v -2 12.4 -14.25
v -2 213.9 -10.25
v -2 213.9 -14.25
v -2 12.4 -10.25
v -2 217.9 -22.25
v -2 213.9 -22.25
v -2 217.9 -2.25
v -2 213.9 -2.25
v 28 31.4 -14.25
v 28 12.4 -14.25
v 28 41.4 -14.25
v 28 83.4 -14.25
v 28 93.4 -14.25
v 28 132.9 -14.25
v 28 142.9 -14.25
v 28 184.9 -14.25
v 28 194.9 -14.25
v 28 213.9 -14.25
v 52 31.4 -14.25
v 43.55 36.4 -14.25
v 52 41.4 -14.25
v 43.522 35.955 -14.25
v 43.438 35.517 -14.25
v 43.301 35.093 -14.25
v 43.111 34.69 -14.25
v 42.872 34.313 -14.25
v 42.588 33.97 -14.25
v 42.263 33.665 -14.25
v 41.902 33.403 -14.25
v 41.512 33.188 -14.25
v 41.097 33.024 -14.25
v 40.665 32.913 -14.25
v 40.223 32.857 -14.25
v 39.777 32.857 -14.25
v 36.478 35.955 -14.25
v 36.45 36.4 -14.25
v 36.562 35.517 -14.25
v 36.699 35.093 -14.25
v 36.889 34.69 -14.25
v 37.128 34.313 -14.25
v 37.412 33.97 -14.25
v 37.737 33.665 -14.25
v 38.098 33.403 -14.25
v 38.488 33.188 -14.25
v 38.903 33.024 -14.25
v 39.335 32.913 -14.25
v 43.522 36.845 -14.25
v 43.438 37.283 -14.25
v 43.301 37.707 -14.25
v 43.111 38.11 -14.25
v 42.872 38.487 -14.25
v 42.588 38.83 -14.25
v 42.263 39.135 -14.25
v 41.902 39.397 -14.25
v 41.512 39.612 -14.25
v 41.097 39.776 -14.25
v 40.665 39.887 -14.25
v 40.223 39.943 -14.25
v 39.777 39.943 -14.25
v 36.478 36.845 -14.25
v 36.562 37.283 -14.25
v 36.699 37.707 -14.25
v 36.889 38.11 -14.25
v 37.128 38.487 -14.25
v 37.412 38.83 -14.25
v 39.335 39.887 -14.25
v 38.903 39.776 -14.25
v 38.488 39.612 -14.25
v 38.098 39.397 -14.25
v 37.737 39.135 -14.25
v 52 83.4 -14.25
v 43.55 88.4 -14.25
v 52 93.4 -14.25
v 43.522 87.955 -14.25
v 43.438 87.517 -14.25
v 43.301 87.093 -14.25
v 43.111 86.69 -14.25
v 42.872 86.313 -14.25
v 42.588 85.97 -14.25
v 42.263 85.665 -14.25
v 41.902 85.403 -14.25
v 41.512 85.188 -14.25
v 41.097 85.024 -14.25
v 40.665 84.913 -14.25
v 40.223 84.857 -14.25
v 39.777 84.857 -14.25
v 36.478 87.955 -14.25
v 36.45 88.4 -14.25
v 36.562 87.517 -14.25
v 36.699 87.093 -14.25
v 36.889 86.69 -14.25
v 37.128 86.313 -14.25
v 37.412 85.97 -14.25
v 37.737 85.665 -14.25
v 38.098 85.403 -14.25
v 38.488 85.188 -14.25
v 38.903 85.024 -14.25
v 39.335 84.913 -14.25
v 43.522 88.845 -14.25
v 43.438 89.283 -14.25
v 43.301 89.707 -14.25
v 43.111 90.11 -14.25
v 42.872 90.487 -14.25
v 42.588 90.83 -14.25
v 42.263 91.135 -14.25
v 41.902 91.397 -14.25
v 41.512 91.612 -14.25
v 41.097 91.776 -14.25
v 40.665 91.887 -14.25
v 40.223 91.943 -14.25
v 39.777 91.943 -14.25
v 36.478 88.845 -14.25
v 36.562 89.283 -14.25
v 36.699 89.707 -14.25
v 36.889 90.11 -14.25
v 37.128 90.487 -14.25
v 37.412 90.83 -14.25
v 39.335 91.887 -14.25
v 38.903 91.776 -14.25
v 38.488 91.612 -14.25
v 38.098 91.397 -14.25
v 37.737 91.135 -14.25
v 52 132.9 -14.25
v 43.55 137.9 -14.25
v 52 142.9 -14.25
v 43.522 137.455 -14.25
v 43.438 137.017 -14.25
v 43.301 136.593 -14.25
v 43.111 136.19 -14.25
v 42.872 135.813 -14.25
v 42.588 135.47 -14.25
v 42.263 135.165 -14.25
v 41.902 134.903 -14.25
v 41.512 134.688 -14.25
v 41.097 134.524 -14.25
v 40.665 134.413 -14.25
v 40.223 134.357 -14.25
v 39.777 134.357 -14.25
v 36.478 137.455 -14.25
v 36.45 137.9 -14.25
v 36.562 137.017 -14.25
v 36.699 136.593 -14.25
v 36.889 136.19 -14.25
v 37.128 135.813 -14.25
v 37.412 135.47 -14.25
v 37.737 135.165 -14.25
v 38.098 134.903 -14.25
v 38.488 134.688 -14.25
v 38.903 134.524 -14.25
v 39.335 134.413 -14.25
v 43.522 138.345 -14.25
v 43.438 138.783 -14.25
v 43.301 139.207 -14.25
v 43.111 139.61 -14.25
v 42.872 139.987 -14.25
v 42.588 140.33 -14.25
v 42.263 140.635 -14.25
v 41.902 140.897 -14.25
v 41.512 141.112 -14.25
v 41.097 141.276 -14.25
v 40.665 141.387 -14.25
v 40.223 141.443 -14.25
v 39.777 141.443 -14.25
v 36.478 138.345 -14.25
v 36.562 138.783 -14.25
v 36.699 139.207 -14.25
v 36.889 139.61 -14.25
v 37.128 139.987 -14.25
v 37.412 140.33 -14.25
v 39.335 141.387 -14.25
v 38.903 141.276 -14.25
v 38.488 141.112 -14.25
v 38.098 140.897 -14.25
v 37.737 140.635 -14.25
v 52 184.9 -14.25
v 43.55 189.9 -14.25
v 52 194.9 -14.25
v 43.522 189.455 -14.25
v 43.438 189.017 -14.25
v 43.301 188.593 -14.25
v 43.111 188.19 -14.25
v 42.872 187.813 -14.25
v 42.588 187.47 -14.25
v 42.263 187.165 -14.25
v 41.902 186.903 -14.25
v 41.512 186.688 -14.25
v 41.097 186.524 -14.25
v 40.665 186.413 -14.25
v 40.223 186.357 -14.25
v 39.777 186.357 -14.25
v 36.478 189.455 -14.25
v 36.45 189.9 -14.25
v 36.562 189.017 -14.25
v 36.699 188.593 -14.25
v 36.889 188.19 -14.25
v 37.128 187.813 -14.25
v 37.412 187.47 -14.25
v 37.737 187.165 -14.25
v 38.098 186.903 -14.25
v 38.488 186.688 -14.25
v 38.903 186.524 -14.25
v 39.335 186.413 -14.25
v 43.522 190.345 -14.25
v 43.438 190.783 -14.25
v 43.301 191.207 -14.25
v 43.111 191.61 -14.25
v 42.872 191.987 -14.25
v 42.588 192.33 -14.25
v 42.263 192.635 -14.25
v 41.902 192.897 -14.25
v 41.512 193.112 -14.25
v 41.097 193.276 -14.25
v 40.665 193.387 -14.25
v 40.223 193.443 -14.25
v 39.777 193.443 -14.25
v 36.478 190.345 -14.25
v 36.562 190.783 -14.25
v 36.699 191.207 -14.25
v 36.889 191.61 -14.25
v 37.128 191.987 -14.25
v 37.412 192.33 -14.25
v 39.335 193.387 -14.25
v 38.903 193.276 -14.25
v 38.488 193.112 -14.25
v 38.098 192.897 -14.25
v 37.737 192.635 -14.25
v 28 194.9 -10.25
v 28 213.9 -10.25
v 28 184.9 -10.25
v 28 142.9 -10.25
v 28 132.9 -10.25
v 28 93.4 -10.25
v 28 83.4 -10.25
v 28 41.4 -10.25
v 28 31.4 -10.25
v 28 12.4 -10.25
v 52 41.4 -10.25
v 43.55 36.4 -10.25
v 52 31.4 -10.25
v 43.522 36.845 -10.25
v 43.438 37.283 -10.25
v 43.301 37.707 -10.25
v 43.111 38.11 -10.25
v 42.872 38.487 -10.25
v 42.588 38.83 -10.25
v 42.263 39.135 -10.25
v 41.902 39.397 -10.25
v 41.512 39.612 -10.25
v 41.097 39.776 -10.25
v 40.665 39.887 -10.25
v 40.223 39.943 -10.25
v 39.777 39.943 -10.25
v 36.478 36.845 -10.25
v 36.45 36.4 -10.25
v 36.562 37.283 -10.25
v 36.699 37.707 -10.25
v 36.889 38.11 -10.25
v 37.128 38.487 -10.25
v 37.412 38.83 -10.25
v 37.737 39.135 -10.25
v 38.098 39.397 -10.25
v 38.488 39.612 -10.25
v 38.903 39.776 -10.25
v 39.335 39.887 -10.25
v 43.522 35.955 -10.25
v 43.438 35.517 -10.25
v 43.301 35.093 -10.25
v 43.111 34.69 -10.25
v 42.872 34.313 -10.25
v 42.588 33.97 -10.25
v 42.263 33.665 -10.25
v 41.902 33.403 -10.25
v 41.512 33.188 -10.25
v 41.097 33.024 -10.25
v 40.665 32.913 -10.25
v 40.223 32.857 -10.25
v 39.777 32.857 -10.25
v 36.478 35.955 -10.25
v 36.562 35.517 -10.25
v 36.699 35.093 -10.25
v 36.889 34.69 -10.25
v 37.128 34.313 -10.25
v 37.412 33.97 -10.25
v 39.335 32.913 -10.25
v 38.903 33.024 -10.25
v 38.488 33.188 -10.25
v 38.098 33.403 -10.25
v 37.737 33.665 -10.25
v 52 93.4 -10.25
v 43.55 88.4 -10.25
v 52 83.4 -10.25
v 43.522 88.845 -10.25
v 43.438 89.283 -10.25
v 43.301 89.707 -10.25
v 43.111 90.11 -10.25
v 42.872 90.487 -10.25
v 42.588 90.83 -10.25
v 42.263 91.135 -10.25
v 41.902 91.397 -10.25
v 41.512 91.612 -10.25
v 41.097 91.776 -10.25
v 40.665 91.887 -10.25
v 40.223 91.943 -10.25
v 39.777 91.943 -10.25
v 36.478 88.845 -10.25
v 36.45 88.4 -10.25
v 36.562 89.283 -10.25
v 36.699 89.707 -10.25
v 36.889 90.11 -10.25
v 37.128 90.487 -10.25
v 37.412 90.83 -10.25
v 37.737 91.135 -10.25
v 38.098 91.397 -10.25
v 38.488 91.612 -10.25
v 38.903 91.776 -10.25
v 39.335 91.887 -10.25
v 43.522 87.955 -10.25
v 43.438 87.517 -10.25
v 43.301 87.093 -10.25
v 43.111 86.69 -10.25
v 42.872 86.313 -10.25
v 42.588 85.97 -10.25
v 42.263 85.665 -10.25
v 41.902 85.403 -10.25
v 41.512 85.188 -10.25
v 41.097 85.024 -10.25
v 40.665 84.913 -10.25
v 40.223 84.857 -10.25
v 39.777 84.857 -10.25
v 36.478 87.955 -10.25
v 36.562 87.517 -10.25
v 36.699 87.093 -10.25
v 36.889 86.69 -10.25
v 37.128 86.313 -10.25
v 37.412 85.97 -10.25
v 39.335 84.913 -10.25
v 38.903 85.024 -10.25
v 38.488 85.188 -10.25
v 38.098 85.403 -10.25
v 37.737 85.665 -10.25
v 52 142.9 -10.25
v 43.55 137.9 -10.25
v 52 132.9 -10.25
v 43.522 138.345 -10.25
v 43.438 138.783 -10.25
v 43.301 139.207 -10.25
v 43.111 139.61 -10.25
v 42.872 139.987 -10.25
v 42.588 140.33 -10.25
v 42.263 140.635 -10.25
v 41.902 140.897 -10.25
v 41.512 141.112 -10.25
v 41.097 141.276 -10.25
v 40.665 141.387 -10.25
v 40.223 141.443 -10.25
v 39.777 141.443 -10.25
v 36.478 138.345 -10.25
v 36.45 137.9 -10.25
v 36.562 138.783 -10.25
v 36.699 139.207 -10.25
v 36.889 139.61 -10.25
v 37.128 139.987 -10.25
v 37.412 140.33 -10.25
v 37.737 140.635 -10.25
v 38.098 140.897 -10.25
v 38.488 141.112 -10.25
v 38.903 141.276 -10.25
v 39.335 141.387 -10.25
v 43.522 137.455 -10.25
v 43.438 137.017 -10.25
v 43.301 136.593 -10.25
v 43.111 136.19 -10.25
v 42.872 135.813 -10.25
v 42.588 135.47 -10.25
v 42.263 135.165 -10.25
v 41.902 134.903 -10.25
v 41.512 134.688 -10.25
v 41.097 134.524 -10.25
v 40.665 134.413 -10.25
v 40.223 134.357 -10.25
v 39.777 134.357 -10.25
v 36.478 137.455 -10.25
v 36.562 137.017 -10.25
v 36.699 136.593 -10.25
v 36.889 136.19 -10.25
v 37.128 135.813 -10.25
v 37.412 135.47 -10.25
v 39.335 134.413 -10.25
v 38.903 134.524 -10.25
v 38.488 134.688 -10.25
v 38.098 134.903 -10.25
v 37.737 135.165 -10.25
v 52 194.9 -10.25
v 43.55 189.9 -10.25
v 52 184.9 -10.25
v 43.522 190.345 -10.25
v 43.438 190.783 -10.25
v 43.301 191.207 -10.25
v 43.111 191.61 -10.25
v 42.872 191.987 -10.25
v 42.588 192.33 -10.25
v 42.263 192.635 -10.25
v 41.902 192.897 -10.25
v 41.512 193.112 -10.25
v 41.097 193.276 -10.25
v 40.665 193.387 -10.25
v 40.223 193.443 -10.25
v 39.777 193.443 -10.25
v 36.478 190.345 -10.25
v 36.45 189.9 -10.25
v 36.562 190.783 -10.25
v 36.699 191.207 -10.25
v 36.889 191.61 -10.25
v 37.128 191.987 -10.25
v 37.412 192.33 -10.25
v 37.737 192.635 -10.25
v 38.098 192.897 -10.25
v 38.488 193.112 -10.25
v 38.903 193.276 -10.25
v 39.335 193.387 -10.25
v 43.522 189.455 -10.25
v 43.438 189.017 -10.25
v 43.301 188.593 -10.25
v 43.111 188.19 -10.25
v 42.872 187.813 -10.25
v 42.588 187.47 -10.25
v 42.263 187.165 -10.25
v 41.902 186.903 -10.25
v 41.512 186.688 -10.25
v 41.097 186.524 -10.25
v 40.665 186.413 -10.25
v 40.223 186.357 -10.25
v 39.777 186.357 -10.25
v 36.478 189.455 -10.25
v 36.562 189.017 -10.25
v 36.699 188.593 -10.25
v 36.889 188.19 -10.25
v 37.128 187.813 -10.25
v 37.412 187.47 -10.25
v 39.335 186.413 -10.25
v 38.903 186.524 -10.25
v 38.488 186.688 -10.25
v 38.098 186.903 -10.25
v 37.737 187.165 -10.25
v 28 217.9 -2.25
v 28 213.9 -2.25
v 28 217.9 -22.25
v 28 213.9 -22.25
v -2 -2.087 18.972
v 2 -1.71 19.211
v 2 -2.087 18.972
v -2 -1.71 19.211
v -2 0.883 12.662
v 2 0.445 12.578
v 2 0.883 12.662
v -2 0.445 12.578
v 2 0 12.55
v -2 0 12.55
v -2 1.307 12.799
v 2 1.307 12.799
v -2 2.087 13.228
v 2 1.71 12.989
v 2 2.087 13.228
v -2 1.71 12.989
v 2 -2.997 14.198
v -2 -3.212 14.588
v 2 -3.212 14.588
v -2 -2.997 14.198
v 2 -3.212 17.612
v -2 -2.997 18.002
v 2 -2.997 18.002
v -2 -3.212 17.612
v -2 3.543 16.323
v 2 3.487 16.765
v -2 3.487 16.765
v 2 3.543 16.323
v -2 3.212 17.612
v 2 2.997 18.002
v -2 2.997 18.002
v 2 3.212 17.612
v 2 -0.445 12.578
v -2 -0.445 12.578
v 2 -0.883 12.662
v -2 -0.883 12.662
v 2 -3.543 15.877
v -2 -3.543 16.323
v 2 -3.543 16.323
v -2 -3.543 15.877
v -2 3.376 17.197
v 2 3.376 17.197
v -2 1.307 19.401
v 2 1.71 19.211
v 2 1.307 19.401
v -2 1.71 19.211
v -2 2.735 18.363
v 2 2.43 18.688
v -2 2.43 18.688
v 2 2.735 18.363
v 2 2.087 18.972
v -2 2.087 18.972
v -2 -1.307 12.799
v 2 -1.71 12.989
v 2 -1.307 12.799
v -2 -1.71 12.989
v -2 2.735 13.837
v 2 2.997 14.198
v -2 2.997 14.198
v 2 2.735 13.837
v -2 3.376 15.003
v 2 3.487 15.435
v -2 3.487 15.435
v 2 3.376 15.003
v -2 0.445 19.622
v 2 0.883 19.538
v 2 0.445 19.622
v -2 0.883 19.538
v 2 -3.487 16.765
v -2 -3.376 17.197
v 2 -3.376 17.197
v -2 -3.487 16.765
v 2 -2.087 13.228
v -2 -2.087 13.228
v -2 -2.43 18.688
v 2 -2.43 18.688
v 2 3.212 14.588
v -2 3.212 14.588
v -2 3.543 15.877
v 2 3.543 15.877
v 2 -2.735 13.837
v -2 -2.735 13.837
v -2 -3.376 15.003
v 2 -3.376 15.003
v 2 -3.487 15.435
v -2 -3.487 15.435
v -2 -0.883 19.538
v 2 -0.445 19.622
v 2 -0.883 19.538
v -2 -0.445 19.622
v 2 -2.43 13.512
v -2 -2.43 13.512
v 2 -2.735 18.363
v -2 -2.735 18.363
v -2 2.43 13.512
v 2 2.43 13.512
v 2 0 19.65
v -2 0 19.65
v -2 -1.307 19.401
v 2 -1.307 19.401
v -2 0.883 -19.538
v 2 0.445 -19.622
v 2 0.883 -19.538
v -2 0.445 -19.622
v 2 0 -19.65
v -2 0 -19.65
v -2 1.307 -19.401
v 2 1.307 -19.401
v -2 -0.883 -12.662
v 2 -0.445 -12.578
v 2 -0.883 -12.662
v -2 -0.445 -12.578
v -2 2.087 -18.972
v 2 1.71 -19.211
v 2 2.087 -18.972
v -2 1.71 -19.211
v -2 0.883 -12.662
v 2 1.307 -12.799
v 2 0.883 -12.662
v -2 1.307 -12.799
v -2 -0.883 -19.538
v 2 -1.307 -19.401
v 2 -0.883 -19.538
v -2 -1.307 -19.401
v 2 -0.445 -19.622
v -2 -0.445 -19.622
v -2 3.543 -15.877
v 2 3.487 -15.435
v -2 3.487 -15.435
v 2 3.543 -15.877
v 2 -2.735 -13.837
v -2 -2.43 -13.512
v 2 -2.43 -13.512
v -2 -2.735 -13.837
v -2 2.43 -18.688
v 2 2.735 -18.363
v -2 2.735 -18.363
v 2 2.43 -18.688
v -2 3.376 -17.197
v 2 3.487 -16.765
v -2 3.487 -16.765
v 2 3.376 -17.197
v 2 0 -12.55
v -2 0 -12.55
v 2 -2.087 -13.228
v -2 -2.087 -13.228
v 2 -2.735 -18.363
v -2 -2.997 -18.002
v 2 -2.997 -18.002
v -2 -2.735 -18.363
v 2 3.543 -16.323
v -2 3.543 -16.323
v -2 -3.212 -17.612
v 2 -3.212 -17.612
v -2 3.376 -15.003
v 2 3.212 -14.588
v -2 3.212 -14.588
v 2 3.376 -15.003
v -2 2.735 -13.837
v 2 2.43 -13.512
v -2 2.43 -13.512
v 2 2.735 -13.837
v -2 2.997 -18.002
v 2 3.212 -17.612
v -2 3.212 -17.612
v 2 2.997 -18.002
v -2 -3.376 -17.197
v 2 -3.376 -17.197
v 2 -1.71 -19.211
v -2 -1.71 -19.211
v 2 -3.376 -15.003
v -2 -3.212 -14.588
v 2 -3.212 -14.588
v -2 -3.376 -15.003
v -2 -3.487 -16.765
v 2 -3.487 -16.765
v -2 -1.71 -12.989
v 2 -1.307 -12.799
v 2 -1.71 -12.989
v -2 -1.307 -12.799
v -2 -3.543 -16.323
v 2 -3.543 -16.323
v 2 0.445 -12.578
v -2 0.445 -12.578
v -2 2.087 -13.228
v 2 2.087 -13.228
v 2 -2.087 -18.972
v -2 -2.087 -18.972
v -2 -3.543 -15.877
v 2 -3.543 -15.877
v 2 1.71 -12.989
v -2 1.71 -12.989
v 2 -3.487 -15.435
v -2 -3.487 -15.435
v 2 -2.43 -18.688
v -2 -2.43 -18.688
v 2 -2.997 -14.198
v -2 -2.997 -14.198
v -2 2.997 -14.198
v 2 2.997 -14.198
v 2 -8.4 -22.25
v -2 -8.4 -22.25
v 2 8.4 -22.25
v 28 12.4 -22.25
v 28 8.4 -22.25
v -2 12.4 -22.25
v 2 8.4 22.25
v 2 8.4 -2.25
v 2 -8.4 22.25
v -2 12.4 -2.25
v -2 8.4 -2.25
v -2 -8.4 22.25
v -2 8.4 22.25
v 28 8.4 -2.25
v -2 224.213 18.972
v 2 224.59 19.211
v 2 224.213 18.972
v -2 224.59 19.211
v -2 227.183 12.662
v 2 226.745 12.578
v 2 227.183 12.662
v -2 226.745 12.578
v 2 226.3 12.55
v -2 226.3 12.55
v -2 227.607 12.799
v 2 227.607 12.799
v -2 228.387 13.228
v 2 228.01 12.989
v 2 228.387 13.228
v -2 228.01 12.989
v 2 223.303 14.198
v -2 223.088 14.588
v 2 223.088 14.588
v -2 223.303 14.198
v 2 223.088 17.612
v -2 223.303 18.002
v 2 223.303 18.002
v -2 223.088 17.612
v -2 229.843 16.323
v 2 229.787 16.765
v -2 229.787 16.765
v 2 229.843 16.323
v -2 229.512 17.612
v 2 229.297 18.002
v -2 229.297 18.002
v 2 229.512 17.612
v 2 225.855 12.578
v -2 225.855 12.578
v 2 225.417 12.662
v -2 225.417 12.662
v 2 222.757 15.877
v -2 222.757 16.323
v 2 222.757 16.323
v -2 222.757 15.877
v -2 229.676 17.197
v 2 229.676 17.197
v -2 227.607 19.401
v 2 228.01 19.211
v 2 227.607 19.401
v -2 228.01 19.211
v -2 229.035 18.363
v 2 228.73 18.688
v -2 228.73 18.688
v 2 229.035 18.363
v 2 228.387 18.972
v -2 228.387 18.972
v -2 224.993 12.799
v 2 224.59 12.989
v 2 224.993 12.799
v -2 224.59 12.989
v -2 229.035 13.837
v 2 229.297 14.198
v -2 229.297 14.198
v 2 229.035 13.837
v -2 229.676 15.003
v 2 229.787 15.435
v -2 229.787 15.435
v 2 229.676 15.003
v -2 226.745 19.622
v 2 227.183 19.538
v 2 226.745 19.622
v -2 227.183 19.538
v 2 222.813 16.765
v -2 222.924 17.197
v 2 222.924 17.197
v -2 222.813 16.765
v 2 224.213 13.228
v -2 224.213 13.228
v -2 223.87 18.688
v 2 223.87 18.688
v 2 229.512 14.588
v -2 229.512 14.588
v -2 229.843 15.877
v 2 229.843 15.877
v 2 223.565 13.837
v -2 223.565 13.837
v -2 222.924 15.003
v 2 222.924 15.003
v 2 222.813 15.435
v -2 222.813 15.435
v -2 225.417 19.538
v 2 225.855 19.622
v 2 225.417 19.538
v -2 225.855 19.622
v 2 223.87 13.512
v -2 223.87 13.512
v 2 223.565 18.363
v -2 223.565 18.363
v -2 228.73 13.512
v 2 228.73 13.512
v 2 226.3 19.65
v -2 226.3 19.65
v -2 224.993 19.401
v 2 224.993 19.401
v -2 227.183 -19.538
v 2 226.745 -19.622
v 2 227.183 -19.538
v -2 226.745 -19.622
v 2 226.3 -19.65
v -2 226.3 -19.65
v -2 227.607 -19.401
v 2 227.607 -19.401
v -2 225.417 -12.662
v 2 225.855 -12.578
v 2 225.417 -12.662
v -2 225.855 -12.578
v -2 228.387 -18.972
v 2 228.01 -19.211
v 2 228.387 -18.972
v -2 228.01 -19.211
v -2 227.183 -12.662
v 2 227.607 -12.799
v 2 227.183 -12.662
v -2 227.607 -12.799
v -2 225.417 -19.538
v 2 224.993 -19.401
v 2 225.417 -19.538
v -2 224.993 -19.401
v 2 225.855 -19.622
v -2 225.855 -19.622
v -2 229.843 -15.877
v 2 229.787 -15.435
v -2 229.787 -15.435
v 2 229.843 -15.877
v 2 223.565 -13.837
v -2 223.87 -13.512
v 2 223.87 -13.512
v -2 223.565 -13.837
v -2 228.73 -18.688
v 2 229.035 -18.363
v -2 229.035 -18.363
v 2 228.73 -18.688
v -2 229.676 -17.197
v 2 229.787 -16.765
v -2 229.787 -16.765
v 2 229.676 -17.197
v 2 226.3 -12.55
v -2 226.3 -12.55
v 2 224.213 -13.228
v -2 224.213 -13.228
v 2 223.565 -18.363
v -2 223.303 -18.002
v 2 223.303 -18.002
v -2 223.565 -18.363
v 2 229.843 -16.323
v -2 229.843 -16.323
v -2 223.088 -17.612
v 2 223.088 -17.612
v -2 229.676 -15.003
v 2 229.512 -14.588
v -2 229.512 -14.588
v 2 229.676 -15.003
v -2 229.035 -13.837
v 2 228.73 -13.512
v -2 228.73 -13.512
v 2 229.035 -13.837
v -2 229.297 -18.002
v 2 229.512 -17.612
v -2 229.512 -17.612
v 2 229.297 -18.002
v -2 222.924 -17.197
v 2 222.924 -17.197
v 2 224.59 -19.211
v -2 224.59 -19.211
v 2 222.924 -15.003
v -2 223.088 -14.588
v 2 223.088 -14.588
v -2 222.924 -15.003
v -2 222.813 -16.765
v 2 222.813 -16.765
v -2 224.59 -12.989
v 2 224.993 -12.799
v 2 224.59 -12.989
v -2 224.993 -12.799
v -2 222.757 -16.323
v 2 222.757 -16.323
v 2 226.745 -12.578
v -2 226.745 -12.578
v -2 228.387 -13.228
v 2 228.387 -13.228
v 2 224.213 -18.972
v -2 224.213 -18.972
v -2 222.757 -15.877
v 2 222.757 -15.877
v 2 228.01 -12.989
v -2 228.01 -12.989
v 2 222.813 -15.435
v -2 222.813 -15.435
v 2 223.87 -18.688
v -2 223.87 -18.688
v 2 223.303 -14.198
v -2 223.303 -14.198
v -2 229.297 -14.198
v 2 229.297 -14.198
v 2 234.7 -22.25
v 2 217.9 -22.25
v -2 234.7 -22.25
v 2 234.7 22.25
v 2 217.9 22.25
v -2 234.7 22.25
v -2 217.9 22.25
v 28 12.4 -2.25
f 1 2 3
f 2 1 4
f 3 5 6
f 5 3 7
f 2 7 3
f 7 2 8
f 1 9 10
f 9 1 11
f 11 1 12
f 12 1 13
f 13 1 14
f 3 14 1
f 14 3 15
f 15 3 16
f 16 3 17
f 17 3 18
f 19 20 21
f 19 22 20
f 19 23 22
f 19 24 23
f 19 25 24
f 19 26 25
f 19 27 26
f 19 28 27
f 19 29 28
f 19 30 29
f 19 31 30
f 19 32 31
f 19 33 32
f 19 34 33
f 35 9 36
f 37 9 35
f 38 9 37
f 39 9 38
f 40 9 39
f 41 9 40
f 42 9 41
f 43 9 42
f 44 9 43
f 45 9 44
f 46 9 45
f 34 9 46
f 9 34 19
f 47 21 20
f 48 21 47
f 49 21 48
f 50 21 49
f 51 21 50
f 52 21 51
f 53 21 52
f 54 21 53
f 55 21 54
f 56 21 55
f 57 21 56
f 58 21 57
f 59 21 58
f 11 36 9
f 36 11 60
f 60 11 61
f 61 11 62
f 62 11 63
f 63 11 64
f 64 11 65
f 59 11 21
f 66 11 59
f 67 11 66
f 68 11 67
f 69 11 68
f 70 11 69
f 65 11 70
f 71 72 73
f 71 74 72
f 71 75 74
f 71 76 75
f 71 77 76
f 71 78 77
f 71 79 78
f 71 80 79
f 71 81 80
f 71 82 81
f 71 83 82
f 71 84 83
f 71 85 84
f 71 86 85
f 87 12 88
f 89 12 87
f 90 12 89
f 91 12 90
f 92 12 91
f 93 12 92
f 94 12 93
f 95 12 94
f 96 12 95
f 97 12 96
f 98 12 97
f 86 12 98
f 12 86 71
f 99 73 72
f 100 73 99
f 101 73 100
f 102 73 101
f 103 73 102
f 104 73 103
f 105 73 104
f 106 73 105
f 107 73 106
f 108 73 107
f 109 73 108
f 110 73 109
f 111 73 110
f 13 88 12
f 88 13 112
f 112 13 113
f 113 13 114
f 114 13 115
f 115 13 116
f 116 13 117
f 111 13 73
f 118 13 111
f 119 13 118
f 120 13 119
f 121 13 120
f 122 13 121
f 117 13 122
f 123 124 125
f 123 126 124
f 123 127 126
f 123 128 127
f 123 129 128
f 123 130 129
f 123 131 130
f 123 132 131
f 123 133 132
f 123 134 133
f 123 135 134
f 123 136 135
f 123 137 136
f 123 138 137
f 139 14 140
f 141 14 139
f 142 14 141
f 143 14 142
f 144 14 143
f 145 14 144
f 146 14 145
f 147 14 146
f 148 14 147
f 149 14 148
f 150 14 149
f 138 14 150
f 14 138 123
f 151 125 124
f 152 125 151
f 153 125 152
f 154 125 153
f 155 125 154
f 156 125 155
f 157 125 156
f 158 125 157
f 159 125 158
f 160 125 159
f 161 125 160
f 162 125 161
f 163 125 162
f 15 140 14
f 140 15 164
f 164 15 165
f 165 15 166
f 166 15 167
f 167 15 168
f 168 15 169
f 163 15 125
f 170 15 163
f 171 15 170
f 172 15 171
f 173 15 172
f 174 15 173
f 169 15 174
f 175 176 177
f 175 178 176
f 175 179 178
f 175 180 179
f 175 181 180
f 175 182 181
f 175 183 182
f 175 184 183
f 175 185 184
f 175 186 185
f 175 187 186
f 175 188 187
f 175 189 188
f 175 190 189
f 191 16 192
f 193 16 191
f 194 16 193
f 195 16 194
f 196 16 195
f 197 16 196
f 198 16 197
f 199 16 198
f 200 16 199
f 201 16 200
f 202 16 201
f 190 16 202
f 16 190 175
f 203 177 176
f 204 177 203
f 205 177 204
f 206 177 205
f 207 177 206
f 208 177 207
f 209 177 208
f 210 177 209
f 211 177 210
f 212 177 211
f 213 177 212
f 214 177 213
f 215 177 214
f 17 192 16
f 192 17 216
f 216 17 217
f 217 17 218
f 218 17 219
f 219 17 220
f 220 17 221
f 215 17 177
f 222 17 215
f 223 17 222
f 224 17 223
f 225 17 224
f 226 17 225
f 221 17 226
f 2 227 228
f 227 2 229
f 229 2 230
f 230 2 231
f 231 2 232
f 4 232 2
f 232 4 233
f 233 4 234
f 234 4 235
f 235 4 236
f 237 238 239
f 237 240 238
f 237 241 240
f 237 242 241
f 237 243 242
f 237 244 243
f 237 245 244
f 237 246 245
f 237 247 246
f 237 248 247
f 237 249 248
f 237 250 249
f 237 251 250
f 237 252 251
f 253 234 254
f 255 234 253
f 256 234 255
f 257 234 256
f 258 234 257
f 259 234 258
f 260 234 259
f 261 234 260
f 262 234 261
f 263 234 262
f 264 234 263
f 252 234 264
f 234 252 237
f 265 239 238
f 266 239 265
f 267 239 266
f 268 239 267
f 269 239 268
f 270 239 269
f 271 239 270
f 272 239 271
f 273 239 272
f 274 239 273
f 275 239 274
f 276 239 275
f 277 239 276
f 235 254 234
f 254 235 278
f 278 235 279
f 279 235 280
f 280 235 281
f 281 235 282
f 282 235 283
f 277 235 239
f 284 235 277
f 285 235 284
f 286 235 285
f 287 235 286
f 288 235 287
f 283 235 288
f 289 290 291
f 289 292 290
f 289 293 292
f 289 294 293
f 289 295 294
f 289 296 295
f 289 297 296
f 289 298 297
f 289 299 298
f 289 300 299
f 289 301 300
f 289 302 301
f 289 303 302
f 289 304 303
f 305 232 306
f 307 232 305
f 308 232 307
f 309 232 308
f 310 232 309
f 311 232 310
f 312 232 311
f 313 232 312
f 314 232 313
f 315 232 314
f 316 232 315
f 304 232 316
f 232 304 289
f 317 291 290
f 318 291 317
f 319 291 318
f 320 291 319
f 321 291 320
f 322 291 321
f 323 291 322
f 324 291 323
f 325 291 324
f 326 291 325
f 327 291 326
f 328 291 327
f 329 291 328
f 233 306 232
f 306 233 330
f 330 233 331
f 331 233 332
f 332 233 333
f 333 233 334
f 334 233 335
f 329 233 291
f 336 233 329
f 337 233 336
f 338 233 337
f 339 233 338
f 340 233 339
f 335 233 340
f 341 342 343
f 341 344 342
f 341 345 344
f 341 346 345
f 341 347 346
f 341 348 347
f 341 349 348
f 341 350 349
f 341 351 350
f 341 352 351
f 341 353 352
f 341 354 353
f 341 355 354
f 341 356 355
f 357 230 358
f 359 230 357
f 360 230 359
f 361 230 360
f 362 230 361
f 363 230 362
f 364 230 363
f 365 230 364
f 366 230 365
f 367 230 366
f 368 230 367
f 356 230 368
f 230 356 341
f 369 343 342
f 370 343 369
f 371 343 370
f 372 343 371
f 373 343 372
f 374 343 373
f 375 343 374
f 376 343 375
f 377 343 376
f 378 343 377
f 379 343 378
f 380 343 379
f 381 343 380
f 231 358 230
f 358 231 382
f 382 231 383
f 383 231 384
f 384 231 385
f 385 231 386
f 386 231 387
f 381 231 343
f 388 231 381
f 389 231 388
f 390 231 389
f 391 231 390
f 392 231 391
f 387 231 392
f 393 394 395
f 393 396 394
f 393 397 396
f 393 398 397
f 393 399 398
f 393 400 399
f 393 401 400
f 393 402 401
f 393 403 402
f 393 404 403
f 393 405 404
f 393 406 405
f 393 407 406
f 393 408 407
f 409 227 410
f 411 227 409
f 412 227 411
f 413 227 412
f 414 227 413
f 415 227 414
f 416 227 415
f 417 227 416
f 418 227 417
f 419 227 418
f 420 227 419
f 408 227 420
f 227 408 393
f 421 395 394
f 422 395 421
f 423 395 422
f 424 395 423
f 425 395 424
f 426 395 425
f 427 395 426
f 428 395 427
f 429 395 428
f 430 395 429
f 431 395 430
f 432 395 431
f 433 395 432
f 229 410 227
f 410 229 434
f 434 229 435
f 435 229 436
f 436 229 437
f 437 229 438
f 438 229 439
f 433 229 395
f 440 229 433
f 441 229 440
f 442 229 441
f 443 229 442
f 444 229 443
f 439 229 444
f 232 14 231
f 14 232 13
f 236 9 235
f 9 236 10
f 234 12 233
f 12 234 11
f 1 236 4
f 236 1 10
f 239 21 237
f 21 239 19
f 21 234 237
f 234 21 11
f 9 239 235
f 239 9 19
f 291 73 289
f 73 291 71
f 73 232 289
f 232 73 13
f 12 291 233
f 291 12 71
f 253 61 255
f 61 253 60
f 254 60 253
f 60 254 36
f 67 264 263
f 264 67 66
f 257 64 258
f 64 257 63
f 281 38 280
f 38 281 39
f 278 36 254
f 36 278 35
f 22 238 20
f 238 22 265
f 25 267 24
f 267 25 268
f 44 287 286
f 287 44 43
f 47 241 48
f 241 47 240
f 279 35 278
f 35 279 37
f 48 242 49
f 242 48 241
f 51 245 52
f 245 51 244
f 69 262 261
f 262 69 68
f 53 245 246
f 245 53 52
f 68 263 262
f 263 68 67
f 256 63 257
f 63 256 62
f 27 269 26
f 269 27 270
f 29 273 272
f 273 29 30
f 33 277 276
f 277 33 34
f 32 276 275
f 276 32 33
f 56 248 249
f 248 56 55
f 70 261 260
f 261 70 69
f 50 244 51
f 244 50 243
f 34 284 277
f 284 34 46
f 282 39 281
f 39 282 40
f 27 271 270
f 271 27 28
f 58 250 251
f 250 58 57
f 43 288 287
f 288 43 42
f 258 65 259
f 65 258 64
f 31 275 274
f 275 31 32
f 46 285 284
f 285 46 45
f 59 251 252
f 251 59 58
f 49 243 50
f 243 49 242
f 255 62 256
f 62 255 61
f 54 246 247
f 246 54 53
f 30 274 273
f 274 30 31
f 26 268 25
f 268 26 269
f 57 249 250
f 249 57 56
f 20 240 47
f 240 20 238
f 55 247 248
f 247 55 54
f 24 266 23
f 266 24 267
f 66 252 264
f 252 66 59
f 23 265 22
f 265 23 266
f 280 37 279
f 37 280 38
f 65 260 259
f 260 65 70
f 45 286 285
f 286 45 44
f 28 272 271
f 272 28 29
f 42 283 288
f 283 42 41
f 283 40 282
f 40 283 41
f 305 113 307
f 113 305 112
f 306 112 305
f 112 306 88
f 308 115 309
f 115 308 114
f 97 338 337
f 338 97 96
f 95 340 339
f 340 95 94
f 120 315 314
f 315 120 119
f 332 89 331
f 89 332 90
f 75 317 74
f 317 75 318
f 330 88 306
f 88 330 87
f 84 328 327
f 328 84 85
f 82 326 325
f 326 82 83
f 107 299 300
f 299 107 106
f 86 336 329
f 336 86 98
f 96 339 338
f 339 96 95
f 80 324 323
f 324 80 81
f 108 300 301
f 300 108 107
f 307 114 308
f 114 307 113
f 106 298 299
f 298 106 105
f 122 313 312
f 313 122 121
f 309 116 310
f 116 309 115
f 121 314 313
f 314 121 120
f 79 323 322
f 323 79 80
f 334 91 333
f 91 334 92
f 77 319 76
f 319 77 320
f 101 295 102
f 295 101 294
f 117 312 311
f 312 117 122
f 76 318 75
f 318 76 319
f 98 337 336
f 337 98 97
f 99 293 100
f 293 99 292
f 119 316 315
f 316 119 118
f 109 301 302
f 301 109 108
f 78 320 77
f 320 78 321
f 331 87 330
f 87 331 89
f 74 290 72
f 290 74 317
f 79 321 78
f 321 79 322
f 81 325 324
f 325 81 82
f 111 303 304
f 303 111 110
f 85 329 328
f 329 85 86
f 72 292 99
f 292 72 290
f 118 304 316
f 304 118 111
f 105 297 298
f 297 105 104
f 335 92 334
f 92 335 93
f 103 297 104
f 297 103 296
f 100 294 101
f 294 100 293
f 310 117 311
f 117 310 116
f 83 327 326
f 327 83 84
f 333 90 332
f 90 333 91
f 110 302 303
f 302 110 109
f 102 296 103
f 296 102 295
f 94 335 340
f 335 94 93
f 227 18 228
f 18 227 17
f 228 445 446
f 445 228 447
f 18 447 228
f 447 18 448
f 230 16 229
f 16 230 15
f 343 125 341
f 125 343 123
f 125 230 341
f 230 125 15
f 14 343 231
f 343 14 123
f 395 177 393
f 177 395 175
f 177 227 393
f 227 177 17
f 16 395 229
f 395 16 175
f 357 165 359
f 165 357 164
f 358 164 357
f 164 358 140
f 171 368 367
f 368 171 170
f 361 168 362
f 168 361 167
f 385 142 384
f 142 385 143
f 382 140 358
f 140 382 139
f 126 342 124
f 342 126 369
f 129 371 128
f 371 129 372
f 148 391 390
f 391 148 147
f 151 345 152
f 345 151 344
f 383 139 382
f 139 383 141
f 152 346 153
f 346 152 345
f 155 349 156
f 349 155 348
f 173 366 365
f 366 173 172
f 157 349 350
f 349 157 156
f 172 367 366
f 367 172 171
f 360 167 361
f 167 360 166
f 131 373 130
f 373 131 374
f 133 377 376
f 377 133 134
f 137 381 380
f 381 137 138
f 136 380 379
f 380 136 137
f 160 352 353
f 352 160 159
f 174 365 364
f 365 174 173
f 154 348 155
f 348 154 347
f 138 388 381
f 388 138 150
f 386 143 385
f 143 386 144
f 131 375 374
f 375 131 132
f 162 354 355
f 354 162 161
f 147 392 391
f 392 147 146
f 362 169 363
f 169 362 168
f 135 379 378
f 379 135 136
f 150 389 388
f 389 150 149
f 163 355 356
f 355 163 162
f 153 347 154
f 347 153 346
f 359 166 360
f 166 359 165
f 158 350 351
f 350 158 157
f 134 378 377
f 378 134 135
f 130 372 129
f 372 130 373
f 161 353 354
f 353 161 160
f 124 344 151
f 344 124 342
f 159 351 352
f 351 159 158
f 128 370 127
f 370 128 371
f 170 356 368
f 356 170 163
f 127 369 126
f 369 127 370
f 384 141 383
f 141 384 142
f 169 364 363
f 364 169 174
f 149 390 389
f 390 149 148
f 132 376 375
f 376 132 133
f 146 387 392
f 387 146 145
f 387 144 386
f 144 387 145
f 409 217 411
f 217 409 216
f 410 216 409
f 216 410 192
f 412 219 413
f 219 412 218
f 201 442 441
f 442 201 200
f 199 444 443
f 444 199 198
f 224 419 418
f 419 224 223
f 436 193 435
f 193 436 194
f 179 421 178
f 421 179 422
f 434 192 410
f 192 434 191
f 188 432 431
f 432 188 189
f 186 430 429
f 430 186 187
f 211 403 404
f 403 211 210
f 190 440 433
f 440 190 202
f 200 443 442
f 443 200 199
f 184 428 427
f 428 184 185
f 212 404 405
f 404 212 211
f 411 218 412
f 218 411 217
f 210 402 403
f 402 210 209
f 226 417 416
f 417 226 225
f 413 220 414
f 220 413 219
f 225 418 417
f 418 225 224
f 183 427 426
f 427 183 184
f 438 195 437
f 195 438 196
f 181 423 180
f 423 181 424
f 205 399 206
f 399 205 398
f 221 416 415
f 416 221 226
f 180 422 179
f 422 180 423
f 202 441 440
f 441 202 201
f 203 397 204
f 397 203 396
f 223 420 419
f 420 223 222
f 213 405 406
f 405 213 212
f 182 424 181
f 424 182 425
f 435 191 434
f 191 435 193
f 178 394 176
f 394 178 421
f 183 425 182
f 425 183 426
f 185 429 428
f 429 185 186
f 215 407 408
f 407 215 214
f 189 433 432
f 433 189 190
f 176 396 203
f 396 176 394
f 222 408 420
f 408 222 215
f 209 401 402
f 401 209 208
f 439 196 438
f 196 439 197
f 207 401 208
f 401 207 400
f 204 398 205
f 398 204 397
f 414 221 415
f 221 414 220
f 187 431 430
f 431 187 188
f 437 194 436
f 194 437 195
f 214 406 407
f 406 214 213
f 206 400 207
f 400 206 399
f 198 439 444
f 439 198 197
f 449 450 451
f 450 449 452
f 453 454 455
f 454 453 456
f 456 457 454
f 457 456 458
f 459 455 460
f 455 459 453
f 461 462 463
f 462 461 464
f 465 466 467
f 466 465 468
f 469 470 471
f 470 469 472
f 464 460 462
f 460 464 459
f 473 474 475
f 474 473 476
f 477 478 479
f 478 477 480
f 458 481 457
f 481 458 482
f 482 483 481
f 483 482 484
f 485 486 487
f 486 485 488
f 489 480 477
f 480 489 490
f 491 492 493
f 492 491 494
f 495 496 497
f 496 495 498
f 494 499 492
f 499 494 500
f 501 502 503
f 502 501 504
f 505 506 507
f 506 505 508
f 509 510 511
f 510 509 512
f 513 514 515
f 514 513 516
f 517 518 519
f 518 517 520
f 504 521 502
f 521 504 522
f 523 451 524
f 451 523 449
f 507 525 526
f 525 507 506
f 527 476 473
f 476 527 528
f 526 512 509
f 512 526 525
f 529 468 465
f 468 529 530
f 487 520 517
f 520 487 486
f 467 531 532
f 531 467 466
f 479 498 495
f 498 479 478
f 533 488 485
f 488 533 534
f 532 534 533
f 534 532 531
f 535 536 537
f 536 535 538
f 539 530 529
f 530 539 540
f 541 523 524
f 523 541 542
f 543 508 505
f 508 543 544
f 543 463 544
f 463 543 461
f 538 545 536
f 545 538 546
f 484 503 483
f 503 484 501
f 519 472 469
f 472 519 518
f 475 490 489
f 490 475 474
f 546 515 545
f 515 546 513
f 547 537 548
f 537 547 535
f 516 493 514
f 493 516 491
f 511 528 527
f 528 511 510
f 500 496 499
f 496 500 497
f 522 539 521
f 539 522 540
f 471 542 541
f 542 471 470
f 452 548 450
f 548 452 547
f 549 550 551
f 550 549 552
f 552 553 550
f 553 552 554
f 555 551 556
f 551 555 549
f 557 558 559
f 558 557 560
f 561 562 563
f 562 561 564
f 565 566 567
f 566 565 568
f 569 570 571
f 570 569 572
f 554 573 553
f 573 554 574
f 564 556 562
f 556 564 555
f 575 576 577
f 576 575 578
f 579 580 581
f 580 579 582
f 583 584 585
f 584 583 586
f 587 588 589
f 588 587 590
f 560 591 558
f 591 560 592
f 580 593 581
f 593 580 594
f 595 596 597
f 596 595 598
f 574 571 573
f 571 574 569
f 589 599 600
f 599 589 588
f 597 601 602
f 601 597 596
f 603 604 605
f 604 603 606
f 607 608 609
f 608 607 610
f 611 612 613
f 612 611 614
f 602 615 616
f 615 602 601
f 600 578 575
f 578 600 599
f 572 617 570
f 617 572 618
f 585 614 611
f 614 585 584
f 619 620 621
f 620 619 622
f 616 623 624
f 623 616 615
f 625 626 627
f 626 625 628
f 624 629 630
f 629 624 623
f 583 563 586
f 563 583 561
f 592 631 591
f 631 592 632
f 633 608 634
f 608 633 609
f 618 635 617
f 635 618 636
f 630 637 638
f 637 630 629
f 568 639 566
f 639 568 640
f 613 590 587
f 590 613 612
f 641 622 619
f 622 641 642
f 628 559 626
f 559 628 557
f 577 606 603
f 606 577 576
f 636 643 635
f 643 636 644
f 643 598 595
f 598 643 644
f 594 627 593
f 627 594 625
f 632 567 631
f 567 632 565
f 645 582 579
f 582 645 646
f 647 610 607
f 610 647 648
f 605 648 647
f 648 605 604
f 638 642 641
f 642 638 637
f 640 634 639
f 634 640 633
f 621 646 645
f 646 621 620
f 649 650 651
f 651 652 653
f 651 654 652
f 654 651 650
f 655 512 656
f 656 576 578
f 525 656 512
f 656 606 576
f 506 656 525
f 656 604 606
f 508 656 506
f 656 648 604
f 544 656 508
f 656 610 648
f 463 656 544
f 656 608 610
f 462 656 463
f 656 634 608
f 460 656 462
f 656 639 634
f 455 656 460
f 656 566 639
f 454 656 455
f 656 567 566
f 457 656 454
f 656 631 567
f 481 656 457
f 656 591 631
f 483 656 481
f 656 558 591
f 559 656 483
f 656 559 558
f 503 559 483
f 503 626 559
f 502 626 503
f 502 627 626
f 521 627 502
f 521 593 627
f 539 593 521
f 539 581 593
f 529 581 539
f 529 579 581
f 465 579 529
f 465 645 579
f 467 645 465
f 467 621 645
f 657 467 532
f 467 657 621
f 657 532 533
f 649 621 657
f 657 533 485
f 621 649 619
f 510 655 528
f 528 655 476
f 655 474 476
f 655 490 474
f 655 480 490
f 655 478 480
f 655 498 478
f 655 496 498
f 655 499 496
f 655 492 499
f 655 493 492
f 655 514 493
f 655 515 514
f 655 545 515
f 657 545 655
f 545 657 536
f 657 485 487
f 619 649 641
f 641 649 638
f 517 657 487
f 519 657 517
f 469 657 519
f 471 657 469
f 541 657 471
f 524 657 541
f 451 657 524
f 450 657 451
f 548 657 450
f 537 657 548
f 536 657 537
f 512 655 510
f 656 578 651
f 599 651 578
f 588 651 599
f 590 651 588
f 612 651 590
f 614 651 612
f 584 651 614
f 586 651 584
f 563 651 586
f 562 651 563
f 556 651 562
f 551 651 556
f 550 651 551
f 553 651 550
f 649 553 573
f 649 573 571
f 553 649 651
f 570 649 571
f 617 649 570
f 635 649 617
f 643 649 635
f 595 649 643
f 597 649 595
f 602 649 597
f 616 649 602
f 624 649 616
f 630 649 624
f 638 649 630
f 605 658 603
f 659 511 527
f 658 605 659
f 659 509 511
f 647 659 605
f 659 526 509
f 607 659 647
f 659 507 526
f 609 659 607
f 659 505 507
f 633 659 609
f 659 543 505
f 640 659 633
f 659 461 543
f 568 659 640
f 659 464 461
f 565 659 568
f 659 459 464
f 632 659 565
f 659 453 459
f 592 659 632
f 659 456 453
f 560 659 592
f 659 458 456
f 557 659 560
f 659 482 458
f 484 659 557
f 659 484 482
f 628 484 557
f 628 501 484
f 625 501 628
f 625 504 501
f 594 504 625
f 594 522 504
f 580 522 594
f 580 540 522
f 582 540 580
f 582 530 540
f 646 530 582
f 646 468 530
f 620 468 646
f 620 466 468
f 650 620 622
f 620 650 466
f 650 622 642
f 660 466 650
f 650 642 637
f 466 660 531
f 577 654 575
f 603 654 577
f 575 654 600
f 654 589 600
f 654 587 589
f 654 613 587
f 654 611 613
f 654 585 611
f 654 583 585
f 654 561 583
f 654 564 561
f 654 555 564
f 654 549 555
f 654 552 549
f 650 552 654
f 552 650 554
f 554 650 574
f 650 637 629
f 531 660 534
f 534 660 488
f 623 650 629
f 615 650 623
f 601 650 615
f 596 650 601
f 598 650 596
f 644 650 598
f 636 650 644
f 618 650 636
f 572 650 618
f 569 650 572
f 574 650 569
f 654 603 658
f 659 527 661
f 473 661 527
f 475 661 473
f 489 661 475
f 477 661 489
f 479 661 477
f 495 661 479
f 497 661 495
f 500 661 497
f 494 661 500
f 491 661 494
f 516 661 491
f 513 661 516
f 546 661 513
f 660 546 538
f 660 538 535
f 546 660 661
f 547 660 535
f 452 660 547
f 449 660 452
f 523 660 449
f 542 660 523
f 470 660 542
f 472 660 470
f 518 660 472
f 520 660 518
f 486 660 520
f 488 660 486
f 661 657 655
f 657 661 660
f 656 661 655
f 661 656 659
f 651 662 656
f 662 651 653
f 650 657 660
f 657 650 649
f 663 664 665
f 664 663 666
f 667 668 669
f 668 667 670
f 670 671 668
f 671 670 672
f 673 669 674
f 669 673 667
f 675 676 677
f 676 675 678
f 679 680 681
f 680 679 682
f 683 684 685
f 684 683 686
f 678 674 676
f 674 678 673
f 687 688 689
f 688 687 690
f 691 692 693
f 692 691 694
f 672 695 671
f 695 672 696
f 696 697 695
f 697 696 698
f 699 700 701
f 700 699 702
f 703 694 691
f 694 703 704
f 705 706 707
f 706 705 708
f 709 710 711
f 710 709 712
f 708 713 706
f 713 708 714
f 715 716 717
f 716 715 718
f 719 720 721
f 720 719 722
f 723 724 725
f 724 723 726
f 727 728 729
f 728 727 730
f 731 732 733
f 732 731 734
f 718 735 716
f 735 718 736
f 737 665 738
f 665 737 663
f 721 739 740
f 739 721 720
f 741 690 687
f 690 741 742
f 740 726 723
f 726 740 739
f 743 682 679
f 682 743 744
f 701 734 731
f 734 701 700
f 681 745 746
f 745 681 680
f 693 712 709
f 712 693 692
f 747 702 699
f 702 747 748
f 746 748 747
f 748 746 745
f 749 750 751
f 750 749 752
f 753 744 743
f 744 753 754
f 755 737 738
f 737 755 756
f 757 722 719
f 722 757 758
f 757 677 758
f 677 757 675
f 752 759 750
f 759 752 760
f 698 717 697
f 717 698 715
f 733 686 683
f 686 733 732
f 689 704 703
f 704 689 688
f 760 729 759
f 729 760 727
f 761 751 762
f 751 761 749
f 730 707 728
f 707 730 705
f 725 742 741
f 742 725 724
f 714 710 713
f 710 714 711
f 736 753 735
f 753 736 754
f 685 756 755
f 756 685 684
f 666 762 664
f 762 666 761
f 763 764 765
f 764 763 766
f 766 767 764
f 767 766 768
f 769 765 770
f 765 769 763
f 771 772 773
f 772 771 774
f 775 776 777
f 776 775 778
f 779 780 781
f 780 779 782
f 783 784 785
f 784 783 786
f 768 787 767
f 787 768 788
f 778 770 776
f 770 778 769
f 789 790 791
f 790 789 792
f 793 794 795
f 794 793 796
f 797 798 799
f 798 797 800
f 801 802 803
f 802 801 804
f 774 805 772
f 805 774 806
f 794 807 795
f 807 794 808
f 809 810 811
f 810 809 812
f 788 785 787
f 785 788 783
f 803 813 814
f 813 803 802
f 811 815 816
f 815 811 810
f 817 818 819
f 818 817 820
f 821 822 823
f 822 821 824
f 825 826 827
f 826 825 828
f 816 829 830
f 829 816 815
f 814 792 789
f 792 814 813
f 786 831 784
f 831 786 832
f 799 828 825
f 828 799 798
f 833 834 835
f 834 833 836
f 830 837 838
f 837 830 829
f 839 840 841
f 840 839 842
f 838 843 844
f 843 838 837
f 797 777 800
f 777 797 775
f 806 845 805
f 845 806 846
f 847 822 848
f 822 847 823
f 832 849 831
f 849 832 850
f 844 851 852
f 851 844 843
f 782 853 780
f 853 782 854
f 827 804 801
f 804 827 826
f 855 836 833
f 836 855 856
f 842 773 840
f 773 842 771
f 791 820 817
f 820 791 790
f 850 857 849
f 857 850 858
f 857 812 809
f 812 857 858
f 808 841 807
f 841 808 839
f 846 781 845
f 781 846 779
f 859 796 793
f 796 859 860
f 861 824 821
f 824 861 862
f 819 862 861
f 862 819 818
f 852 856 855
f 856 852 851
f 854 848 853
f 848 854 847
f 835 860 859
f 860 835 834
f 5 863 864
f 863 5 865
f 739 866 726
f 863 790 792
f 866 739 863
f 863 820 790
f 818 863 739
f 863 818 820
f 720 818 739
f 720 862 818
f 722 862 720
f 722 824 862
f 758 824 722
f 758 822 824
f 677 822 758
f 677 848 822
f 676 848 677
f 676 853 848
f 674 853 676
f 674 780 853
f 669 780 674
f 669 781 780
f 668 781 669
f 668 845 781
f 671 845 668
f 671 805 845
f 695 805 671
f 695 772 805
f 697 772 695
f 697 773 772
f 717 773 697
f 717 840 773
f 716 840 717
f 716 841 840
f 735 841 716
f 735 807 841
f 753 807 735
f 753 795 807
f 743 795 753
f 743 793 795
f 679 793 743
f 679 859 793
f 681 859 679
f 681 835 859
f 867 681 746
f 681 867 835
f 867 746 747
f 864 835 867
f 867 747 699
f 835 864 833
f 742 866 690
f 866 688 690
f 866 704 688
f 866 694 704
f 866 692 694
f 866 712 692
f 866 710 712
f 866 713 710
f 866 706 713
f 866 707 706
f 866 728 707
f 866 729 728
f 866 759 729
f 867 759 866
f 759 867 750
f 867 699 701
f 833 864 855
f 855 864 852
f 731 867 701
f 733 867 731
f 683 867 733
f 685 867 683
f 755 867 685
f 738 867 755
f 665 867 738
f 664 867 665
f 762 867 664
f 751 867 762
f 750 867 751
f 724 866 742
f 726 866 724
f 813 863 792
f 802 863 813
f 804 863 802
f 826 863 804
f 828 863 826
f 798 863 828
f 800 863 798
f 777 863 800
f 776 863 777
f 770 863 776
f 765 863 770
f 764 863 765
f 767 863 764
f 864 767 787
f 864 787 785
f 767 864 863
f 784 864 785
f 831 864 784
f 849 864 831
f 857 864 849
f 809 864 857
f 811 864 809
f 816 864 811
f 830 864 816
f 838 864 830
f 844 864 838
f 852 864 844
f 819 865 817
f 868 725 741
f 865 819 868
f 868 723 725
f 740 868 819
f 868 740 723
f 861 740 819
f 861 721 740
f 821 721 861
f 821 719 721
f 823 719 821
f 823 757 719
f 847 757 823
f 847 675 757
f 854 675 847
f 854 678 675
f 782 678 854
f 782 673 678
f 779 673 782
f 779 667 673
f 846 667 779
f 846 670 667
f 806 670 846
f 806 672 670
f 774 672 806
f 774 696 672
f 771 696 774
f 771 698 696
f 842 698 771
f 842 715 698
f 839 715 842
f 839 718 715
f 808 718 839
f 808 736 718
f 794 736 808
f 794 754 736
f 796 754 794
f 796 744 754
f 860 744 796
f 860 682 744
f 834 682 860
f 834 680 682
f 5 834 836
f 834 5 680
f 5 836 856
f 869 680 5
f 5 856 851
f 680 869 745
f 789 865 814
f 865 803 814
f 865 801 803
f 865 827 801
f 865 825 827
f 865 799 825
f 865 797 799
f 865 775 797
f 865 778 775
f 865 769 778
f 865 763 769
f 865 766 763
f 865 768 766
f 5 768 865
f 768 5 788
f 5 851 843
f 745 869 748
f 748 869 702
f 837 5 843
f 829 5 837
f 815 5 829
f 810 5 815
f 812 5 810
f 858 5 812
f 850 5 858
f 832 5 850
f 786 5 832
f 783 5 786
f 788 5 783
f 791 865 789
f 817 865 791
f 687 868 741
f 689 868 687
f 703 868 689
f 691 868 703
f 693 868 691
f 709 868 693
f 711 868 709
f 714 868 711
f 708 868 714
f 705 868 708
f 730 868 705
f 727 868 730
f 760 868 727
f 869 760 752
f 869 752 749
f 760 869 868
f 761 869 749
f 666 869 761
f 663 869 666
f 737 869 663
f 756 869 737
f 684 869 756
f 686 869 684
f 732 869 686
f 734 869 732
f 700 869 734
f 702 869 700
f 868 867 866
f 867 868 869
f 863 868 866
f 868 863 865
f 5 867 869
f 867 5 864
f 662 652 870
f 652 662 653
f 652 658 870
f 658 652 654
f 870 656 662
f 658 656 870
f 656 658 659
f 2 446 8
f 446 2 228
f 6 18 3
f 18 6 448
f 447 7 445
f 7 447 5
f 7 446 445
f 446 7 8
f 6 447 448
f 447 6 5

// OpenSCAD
// file: lego_beam.scad
//Example:
// lego_beam(4);


//$fn=50*1.0;

pitch = 8.0*1.0;
radius1 = 5.0/2;
radius2 = 6.1/2;
height = 8.0*1.0; //7.8
depth = 0.95*1.0;
width = 8.0*1.0; //7.3 
overhang = 0.05*1.0;

module body(beam_len)
{
    translate([0, width/2, 0]) 
    hull() {
        cylinder(r=width/2, h=height);
        
        translate([(beam_len-1)*pitch, 0, 0]) 
            cylinder(r=width/2, h=height);
    }
}

module hole(beam_len)
{
    union()
	{
        //core
        cylinder(r=radius1,h=height);
        
        //top countersink
        translate([0,0,height-depth+overhang]) 
            cylinder(r=radius2,h=depth);
        
        //bottom countersink
        translate([0,0,-overhang/2]) 
            cylinder(r=radius2,h=depth);
        
        translate([0,0,depth-overhang])
            cylinder(h=(radius2 - radius1), r1=radius2, r2=radius1);
    }
}

module lego_beam(beam_len)
{
    difference()
    {
        body(beam_len);
       
        for (i = [1:beam_len])
        {
            translate([(i-1)*pitch, width/2, 0])
                hole(beam_len);
        }
    }
}
// main file
    $fn=50*1.0;

include <lego_beam.scad>;

// length of rack equipment mounting bracket 19 inch or 486.2 mm
// max length of equipment body 449
// (482.6-449)/2 = 16.8

scale([1,1,1]) {

	translate([30/2-4/2,16.8/2+4/2,-44.5/2+20/2]) {
		rotate([90,0,0]) {
            horizontal();
        }
    }

	translate([30/2-4/2,243.10-1.5*16.8-4/2,-44.5/2+20/2]) {
		rotate([90,0,0]) {
            horizontal();
        }
    }

	translate([(30+27)/2-4/2,100/2+16.8/2+4,-44.5/2+4/2+4+4]) {
		rotate([0,180,0]) {
            vertical2();
        }
    }

	translate([(30+27)/2-4/2,243.10-100/2-1.5*16.8-4,-44.5/2+4/2+4+4]) {
		rotate([0,180,0]) {
            vertical2();
        }
    }

/*join*/
    translate([30/2-4/2,243.10/2,-44.5/2+4/2+4+4])
        cube(size = [30,20,4], center = true);

/*left side*/
	translate([0,0,0]) {
		rotate([0,90,0]) {
            vertical();
        }
    }

/*right side*/    
	translate([0,243.10-16.8,0]) {
		rotate([0,90,0]) {
            vertical();
        }
    }


}

module m4_cone_3mm()
{
    union() {
        cylinder(h=3.02, r1=4/2+0.1, r2=4/2+0.1);
        cylinder(h=2.2, r1=7.5/2+0.1, r2=4/2+0.1);
    }
}

module horizontal()
{
        cube(size = [30,20,4], center = true);
}



module vertical()
{
    difference() {
        union() {
            cube(size = [44.5,16.8,4], center = true);
        }
        union() {
            translate([-44.5/2+6.15,0,-5])
                cylinder(h=10, r1=3.55, r2=3.55);
            translate([44.5/2-6.15,0,-5])
                cylinder(h=10, r1=3.55, r2=3.55);

        }
    }
}

module vertical2()
{
    difference() {
        union() {
            translate([27/2,0,-0])
                cube(size = [30,100,4], center = true);
            translate([27-55/2,-52/2,-0])
                cube(size = [50,10,4], center = true);
            translate([27-55/2, 52/2,-0])
                cube(size = [50,10,4], center = true);
        }
        union() {
            translate([-27/2,-52/2,-5])
                cylinder(h=10, r1=3.55, r2=3.55);
            translate([-27/2,52/2,-5])
                cylinder(h=10, r1=3.55, r2=3.55);
        }
    }
}
